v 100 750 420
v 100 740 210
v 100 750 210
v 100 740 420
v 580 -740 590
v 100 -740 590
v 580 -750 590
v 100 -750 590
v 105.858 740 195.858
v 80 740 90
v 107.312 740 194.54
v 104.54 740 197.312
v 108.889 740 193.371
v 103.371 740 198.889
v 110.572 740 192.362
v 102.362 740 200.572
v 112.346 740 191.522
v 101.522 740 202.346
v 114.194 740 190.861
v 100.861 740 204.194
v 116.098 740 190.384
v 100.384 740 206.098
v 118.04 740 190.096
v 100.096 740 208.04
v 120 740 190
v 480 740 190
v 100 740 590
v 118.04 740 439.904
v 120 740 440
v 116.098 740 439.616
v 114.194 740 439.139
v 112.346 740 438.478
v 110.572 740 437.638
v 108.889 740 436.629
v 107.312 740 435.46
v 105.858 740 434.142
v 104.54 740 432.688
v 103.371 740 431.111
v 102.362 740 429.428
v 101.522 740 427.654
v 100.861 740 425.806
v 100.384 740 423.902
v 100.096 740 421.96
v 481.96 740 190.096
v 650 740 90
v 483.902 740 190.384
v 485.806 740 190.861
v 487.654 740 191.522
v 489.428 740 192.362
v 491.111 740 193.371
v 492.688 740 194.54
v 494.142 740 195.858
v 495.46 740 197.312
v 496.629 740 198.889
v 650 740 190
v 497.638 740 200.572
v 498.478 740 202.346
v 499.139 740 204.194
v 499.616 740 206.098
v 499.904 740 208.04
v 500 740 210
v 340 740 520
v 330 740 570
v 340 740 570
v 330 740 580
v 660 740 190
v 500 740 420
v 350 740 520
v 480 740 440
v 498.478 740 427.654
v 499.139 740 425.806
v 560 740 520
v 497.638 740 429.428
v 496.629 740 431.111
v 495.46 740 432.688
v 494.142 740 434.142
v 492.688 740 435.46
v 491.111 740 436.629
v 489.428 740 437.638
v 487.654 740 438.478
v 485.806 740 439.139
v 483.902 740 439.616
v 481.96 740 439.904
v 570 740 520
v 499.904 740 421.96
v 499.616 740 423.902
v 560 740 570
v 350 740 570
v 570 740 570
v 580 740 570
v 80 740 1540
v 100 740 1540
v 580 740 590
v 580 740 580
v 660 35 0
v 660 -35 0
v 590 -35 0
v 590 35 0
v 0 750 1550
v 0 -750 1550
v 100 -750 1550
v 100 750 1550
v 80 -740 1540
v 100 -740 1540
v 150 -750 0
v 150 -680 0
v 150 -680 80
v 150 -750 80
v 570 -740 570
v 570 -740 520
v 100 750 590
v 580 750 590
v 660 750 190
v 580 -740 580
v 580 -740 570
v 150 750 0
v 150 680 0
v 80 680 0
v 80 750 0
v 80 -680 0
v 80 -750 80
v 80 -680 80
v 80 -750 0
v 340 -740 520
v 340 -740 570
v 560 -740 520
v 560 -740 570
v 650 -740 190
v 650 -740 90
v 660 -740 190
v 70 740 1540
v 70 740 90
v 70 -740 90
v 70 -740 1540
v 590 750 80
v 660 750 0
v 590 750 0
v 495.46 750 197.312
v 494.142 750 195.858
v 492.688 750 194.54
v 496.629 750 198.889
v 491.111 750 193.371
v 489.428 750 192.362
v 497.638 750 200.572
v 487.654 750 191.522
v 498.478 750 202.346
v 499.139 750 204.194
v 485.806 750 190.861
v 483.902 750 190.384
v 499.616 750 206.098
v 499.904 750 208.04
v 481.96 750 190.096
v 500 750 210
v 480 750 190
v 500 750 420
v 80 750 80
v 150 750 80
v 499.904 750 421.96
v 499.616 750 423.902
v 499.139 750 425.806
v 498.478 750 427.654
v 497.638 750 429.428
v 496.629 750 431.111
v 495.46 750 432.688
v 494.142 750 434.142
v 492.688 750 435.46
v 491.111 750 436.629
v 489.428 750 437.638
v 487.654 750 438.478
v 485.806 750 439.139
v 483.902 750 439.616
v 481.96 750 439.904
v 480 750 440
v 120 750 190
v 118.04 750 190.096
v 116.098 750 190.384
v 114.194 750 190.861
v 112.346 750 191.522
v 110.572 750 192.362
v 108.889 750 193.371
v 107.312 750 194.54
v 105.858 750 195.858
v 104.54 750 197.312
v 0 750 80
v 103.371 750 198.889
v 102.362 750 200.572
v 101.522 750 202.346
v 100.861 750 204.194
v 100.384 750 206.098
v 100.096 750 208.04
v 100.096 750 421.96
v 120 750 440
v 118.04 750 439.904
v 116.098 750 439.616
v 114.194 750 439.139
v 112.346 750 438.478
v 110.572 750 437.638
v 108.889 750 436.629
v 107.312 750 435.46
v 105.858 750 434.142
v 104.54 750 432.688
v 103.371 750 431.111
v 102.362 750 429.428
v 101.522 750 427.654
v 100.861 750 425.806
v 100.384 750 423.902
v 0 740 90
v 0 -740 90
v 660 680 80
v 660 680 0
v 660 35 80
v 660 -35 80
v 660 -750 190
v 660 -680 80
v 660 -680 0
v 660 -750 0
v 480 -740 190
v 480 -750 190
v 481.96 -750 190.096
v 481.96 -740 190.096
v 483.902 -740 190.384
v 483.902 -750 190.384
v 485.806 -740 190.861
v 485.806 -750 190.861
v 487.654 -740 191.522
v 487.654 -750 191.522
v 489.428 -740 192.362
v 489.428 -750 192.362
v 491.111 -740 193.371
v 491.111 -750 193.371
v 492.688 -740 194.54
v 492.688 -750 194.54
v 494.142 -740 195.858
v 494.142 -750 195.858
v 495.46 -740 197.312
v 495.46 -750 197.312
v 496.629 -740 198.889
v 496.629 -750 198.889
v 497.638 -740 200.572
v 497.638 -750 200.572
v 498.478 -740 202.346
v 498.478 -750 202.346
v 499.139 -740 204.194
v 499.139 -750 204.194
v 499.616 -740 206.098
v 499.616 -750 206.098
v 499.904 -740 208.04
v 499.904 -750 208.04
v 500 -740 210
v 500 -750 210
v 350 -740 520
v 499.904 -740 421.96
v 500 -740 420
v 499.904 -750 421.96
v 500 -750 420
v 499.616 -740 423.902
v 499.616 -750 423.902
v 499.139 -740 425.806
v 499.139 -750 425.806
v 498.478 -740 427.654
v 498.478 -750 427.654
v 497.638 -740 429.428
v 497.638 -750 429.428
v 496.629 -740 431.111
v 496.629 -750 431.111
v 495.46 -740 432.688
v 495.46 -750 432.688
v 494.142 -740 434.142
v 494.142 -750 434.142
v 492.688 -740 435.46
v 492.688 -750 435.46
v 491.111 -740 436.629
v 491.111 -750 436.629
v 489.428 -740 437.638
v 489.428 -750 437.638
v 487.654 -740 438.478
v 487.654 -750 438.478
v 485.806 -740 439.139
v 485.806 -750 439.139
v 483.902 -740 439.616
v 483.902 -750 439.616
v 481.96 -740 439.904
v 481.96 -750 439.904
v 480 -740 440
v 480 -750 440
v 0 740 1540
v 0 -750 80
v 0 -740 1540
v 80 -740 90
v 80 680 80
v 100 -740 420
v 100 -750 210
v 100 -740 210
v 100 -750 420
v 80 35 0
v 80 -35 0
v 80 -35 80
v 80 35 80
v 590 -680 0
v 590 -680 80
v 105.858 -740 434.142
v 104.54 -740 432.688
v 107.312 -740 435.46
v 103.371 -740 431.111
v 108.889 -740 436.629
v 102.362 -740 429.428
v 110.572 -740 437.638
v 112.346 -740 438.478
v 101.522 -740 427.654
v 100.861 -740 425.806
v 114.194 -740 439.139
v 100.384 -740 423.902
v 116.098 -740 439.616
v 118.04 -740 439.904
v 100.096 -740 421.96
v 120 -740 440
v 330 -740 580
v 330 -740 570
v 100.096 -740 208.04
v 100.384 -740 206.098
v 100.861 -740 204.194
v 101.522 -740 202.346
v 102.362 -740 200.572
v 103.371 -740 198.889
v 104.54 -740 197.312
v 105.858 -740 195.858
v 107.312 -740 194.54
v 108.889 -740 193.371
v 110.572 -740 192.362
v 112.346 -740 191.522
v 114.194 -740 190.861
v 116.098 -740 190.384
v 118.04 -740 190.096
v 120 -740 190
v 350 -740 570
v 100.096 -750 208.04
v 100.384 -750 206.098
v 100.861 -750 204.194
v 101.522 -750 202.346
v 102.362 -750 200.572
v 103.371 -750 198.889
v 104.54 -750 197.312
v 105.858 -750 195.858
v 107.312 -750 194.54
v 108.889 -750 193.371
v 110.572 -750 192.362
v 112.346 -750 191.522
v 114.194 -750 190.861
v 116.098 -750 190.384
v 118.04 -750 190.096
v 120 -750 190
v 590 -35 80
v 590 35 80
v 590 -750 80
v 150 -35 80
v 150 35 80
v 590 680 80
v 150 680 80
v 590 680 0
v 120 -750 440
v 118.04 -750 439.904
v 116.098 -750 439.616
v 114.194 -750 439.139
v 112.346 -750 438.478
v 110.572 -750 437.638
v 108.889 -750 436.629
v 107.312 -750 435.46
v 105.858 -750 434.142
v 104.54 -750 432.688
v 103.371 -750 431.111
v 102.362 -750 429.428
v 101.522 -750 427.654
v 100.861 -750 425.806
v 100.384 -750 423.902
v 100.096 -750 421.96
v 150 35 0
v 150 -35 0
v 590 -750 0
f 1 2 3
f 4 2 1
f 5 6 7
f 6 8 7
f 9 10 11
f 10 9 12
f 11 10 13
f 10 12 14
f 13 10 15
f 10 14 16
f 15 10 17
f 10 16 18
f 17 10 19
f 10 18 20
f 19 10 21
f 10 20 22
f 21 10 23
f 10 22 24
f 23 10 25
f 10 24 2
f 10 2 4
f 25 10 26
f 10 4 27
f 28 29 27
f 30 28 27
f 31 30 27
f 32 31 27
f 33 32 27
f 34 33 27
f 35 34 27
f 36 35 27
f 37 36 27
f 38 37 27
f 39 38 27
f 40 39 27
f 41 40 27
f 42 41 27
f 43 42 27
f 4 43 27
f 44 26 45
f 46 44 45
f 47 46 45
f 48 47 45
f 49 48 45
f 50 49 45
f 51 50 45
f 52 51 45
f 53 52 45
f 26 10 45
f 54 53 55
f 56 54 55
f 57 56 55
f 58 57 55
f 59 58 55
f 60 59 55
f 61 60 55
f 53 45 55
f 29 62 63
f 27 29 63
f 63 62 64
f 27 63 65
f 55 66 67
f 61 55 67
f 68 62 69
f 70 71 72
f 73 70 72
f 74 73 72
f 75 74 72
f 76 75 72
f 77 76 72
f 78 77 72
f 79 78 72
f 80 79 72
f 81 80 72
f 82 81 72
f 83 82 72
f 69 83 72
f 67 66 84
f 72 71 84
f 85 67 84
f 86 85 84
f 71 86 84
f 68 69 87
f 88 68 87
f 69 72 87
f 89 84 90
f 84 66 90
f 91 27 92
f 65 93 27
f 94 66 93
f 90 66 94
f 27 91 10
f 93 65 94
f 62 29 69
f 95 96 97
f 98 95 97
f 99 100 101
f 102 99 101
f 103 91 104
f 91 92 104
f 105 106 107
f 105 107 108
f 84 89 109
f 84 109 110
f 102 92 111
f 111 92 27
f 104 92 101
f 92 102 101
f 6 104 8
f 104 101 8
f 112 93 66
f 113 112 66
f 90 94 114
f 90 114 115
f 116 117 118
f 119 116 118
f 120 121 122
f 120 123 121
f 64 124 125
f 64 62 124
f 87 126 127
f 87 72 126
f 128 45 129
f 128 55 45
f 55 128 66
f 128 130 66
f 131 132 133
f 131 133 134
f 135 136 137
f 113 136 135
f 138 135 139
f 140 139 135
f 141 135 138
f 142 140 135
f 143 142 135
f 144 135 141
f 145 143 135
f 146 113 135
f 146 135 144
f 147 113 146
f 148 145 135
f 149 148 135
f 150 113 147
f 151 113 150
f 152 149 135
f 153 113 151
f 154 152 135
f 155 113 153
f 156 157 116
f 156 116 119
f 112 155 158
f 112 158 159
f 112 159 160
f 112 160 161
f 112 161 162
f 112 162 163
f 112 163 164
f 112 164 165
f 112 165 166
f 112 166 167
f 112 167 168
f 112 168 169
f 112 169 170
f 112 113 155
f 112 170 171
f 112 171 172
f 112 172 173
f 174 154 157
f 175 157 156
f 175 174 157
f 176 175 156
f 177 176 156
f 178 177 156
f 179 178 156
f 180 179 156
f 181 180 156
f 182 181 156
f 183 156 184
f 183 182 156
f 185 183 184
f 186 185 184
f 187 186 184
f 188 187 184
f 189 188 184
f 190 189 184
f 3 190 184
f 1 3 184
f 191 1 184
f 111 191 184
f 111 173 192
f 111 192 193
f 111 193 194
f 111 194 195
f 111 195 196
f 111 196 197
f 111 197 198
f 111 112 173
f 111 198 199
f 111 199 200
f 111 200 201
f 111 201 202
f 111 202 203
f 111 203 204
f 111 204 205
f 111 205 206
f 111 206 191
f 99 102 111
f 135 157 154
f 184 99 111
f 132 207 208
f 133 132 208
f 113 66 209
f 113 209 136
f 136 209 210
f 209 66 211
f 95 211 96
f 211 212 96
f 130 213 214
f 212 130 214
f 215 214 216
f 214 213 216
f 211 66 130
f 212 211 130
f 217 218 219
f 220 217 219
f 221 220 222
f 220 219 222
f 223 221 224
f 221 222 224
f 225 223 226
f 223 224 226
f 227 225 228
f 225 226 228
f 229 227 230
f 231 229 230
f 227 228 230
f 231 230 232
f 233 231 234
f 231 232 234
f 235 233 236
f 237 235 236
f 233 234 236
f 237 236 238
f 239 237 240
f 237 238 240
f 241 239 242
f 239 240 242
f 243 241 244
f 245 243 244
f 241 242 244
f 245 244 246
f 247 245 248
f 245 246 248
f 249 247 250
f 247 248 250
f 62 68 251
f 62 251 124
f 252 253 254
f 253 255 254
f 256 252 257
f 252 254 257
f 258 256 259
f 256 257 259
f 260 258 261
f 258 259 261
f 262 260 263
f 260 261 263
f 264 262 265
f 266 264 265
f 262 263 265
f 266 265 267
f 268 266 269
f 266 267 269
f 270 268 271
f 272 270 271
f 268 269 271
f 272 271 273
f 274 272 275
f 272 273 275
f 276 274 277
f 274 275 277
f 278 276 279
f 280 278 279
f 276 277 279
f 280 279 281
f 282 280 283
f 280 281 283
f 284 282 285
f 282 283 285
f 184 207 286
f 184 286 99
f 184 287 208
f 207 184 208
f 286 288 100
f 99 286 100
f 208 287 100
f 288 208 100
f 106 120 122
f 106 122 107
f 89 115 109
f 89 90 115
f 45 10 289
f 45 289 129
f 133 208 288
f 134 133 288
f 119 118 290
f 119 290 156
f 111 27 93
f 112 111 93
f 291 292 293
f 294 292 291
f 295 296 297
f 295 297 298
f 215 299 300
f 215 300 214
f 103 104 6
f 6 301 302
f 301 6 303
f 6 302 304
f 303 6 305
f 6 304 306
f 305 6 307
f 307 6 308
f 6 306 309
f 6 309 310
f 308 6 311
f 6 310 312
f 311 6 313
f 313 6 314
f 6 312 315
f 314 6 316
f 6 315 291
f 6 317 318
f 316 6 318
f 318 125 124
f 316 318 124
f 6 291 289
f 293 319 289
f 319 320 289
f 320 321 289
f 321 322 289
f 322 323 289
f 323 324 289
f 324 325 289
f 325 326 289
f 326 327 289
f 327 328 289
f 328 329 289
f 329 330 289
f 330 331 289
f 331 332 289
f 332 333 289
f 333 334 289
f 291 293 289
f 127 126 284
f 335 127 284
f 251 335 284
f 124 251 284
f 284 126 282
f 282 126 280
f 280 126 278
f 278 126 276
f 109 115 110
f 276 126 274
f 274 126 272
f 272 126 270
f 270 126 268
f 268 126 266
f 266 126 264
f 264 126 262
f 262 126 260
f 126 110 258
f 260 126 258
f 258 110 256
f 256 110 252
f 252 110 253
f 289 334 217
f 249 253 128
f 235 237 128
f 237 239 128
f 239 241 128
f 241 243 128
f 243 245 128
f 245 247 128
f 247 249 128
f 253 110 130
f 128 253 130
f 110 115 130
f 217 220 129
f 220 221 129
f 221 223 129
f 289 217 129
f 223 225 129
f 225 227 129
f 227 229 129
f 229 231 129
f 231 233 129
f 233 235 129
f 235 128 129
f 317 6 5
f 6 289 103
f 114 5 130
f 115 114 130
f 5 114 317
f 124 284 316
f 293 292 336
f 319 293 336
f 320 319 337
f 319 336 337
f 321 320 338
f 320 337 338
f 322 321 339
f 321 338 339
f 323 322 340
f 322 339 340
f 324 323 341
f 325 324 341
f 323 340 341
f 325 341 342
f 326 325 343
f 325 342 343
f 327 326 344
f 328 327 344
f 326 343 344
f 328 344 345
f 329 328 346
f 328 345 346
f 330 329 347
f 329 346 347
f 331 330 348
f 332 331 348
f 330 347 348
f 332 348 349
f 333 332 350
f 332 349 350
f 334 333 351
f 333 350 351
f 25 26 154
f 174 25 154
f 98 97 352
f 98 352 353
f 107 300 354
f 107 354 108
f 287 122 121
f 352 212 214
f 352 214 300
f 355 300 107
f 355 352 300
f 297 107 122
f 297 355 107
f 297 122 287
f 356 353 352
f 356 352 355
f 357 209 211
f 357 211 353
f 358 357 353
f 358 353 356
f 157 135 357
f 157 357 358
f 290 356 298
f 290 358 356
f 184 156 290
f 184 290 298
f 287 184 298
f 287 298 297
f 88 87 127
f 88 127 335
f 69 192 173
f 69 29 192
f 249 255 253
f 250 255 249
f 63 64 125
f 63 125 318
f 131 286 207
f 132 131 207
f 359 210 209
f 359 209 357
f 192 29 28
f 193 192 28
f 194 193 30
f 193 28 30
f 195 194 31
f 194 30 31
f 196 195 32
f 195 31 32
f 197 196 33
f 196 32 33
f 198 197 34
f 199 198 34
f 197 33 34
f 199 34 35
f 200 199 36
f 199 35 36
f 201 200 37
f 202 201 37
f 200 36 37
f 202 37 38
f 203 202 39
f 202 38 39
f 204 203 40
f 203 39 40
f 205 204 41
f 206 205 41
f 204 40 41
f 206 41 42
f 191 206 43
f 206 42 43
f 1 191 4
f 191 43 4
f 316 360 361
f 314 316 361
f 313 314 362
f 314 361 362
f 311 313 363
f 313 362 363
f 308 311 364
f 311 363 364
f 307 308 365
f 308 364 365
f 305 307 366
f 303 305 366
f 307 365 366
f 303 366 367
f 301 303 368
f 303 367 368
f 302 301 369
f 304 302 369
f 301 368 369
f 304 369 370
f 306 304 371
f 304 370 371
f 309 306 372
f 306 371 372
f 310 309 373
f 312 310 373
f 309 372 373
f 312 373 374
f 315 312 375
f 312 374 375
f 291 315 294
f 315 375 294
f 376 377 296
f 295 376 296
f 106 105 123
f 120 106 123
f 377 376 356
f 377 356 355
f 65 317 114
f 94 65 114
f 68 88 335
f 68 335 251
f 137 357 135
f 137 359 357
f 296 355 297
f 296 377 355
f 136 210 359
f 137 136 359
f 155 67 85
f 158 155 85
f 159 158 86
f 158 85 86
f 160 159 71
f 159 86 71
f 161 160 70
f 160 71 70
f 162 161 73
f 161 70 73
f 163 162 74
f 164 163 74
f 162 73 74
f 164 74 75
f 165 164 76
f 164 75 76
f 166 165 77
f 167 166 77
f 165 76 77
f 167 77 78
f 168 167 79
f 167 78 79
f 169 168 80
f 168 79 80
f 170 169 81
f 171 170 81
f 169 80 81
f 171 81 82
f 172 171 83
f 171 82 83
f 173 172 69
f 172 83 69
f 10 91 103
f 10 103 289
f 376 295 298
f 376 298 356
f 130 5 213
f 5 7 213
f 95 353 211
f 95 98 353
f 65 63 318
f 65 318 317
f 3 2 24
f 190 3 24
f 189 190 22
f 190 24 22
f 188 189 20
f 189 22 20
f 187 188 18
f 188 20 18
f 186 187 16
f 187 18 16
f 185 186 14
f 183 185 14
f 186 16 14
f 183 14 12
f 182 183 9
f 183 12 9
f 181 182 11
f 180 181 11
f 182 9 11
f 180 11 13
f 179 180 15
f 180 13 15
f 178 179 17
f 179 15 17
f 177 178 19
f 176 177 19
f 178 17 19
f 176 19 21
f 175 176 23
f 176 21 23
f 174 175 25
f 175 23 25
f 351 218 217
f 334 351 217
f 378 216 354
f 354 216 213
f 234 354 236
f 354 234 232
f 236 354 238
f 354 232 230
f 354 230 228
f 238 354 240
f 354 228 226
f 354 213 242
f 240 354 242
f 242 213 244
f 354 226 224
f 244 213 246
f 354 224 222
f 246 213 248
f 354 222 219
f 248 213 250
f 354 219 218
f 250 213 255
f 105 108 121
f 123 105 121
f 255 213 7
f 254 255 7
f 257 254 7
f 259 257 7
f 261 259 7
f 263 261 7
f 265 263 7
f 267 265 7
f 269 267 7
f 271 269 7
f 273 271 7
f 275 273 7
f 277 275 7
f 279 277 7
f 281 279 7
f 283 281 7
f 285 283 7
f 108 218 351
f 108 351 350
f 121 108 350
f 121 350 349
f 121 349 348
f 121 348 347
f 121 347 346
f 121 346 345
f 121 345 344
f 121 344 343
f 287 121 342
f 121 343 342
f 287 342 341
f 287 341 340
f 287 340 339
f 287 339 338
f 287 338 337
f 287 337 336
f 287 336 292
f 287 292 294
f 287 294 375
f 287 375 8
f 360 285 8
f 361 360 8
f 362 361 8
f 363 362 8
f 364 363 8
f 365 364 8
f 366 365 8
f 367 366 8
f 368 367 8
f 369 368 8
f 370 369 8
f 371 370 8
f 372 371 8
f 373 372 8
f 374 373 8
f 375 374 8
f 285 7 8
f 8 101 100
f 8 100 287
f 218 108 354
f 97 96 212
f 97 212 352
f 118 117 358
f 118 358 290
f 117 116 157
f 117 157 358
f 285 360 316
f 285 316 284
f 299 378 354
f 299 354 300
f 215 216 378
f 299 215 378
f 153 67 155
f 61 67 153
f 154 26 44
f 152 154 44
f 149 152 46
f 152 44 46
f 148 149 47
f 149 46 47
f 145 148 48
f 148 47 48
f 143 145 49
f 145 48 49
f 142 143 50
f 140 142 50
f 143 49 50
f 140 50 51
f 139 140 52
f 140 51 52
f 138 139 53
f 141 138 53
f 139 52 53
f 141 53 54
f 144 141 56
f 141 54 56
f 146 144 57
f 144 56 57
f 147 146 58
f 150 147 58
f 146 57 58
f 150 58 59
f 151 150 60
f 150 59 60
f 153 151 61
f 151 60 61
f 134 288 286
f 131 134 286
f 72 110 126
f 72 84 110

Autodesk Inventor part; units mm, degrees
ref_plane "YZ Plane" through (0, 0, 0) normal (1, 0, 0) x (0, 1, 0)
ref_plane "XZ Plane" through (0, 0, 0) normal (0, 1, 0) x (-1, 0, 0)
ref_plane "XY Plane" through (0, 0, 0) normal (0, 0, 1) x (1, 0, 0)
sketch "Sketch1" plane through (0, 0, 0) normal (0, 1, 0) x (-1, 0, 0)
  line L0 (0, 0) -> (0, 1550)
  line L1 (0, 1550) -> (-100, 1550)
  line L2 (-100, 1550) -> (-100, 590)
  line L3 (-100, 590) -> (-580, 590)
  line L4 (-580, 590) -> (-660, 190)
  line L5 (-660, 190) -> (-660, 0)
  line L6 (-660, 0) -> (0, 0)
  dimension "d0" = 1550
  dimension "d1" = 100
  dimension "d2" = 660
  dimension "d3" = 190
  dimension "d4" = 480
  dimension "d5" = 590
extrude "Extrusion1" add sketch "Sketch1" along normal mid plane 1500
sketch "Sketch2" plane through (660, 750, 0) normal (0, 0, -1) x (-1, 0, 0)
  line L0 (0, -1500) -> (0, 0) projected
  line L1 (660, -1500) -> (0, -1500) projected
  line L2 (660, -1500) -> (660, 0) projected
  line L3 (0, 0) -> (660, 0) projected
  line L4 (0, -1500) -> (0, 0) projected
  line L5 (0, -1500) -> (70, -1500)
  line L6 (70, -1500) -> (70, -1430)
  line L7 (70, -1430) -> (0, -1430)
  line L8 (0, -1430) -> (0, -1500)
  line L9 (0, -785) -> (70, -785)
  line L10 (70, -785) -> (70, -715)
  line L11 (70, -715) -> (0, -715)
  line L12 (0, -715) -> (0, -785)
  line L13 (0, -70) -> (70, -70)
  line L14 (70, -70) -> (70, 0)
  line L15 (70, 0) -> (0, 0)
  line L16 (0, 0) -> (0, -70)
  line L17 (510, -1500) -> (580, -1500)
  line L18 (580, -1500) -> (580, -1430)
  line L19 (580, -1430) -> (510, -1430)
  line L20 (510, -1430) -> (510, -1500)
  line L21 (510, -785) -> (580, -785)
  line L22 (580, -785) -> (580, -715)
  line L23 (580, -715) -> (510, -715)
  line L24 (510, -715) -> (510, -785)
  line L25 (510, -70) -> (580, -70)
  line L26 (580, -70) -> (580, 0)
  line L27 (580, 0) -> (510, 0)
  line L28 (510, 0) -> (510, -70)
  point P0 (660, -750)
  point P1 (70, 0)
  point P2 (0, -715)
  point P3 (0, -1430)
  point P4 (70, -1500)
  dimension "d8" = 70
  dimension "d9" = 70
  dimension "d20" = 715
  dimension "d23" = 510
extrude "Extrusion2" cut sketch "Sketch2" against normal blind 80 contours L0 L9 L10 L11 L13 L14 L3 L28 L25 L26 L2 L1 L18 L19 L20 L6 L7
sketch "Sketch3" plane through (0, -750, 1550) normal (-1, 0, 0) x (0, 0, 1)
  line L0 (0, 1500) -> (0, 0) projected
  line L1 (-1470, 1500) -> (0, 1500) projected
  line L2 (0, 0) -> (-1470, 0) projected
  line L3 (-1470, 1500) -> (-1470, 0) projected
  line L4 (-10, 1490) -> (-1460, 1490)
  line L5 (-1460, 1490) -> (-1460, 10)
  line L6 (-1460, 10) -> (-10, 10)
  line L7 (-10, 10) -> (-10, 1490)
  point P0 (-1550, 750)
  dimension "d28" = 10
  dimension "d30" = 10
  dimension "d31" = 10
  dimension "d32" = 10
extrude "Extrusion3" cut sketch "Sketch3" against normal blind 70 contours L7 L6 L5 L4
sketch "Sketch4" plane through (0, -750, 0) normal (0, -1, 0) x (1, 0, 0)
  line L0 (120, 440) -> (480, 440)
  line L1 (500, 420) -> (500, 210)
  line L2 (480, 190) -> (120, 190)
  line L3 (100, 210) -> (100, 420)
  line L4 (0, 1550) -> (0, 80) projected
  line L5 (150, 80) -> (590, 80) projected
  arc A0 (120, 440) -> (100, 420) centre (120, 420) ccw
  arc A1 (100, 210) -> (120, 190) centre (120, 210) ccw
  arc A2 (480, 190) -> (500, 210) centre (480, 210) ccw
  arc A3 (500, 420) -> (480, 440) centre (480, 420) ccw
  point P0 (0, 0)
  point P1 (100, 440)
  point P2 (500, 190)
  point P3 (500, 440)
  dimension "d35" = 400
  dimension "d36" = 250
  dimension "d37" = 100
  dimension "d38" = 110
  dimension "d39" = 20
extrude "Extrusion4" cut sketch "Sketch4" against normal through all
sketch "Sketch5" plane through (660, -750, 190) normal (1, 0, 0) x (0, 0, -1)
  line L0 (-1350, 10) -> (0, 10)
  line L1 (0, 10) -> (0, 1490)
  line L2 (0, 1490) -> (-1350, 1490)
  line L3 (-1350, 1490) -> (-1350, 10)
  line L4 (-1360, 1500) -> (-400, 1500) projected
  line L5 (-400, 0) -> (-1360, 0) projected
  line L6 (-1360, 0) -> (-1360, 1500) projected
  line L7 (0, 0) -> (0, 1500) projected
  point P0 (190, 750)
  point P1 (0, 750)
  point P2 (0, 750)
  dimension "d42" = 10
  dimension "d43" = 10
  dimension "d44" = 10
extrude "Extrusion5" cut sketch "Sketch5" against normal blind 580
sketch "Sketch6" plane through (120, -750, 190) normal (0, 0, 1) x (1, 0, 0)
  line L0 (-40, 1490) -> (530, 1490)
  line L1 (530, 1490) -> (530, 10)
  line L2 (530, 10) -> (-40, 10)
  line L3 (-40, 10) -> (-40, 1490)
  line L4 (540, 10) -> (540, 1490) projected
  line L5 (-20, 0) -> (-20, 1500) projected
  line L6 (-50, 10) -> (-50, 1490) projected
  point P0 (-120, 750)
  point P1 (245, 1490)
  point P2 (460, 1490)
  point P3 (245, 10)
  point P4 (460, 10)
  dimension "d47" = 10
  dimension "d50" = 10
extrude "Extrusion6" cut sketch "Sketch6" against normal blind 100
sketch "Sketch8" plane through (100, 740, 590) normal (0, -1, 0) x (1, 0, 0)
  line L0 (230, -10) -> (480, -10)
  line L1 (480, -10) -> (480, -20)
  line L2 (480, -20) -> (230, -20)
  line L3 (230, -20) -> (230, -10)
  line L4 (240, -20) -> (250, -20)
  line L5 (250, -20) -> (250, -70)
  line L6 (250, -70) -> (240, -70)
  line L7 (240, -70) -> (240, -20)
  line L8 (460, -20) -> (470, -20)
  line L9 (470, -20) -> (470, -70)
  line L10 (470, -70) -> (460, -70)
  line L11 (460, -70) -> (460, -20)
  line L12 (0, 0) -> (480, 0) projected
  point P0 (-100, -590)
  point P1 (480, -15)
  point P2 (470, -20)
  point P3 (250, -20)
  dimension "d51" = 250
  dimension "d52" = 10
  dimension "d53" = 10
  dimension "d54" = 10
  dimension "d55" = 10
  dimension "d56" = 10
  dimension "d57" = 50
  dimension "d58" = 10
extrude "Extrusion7" add sketch "Sketch8" along normal blind 1480
equation "\"d53\" = d52"
equation "\"d54\" = d52"
properties part number "Стол приёма ГПХ"
